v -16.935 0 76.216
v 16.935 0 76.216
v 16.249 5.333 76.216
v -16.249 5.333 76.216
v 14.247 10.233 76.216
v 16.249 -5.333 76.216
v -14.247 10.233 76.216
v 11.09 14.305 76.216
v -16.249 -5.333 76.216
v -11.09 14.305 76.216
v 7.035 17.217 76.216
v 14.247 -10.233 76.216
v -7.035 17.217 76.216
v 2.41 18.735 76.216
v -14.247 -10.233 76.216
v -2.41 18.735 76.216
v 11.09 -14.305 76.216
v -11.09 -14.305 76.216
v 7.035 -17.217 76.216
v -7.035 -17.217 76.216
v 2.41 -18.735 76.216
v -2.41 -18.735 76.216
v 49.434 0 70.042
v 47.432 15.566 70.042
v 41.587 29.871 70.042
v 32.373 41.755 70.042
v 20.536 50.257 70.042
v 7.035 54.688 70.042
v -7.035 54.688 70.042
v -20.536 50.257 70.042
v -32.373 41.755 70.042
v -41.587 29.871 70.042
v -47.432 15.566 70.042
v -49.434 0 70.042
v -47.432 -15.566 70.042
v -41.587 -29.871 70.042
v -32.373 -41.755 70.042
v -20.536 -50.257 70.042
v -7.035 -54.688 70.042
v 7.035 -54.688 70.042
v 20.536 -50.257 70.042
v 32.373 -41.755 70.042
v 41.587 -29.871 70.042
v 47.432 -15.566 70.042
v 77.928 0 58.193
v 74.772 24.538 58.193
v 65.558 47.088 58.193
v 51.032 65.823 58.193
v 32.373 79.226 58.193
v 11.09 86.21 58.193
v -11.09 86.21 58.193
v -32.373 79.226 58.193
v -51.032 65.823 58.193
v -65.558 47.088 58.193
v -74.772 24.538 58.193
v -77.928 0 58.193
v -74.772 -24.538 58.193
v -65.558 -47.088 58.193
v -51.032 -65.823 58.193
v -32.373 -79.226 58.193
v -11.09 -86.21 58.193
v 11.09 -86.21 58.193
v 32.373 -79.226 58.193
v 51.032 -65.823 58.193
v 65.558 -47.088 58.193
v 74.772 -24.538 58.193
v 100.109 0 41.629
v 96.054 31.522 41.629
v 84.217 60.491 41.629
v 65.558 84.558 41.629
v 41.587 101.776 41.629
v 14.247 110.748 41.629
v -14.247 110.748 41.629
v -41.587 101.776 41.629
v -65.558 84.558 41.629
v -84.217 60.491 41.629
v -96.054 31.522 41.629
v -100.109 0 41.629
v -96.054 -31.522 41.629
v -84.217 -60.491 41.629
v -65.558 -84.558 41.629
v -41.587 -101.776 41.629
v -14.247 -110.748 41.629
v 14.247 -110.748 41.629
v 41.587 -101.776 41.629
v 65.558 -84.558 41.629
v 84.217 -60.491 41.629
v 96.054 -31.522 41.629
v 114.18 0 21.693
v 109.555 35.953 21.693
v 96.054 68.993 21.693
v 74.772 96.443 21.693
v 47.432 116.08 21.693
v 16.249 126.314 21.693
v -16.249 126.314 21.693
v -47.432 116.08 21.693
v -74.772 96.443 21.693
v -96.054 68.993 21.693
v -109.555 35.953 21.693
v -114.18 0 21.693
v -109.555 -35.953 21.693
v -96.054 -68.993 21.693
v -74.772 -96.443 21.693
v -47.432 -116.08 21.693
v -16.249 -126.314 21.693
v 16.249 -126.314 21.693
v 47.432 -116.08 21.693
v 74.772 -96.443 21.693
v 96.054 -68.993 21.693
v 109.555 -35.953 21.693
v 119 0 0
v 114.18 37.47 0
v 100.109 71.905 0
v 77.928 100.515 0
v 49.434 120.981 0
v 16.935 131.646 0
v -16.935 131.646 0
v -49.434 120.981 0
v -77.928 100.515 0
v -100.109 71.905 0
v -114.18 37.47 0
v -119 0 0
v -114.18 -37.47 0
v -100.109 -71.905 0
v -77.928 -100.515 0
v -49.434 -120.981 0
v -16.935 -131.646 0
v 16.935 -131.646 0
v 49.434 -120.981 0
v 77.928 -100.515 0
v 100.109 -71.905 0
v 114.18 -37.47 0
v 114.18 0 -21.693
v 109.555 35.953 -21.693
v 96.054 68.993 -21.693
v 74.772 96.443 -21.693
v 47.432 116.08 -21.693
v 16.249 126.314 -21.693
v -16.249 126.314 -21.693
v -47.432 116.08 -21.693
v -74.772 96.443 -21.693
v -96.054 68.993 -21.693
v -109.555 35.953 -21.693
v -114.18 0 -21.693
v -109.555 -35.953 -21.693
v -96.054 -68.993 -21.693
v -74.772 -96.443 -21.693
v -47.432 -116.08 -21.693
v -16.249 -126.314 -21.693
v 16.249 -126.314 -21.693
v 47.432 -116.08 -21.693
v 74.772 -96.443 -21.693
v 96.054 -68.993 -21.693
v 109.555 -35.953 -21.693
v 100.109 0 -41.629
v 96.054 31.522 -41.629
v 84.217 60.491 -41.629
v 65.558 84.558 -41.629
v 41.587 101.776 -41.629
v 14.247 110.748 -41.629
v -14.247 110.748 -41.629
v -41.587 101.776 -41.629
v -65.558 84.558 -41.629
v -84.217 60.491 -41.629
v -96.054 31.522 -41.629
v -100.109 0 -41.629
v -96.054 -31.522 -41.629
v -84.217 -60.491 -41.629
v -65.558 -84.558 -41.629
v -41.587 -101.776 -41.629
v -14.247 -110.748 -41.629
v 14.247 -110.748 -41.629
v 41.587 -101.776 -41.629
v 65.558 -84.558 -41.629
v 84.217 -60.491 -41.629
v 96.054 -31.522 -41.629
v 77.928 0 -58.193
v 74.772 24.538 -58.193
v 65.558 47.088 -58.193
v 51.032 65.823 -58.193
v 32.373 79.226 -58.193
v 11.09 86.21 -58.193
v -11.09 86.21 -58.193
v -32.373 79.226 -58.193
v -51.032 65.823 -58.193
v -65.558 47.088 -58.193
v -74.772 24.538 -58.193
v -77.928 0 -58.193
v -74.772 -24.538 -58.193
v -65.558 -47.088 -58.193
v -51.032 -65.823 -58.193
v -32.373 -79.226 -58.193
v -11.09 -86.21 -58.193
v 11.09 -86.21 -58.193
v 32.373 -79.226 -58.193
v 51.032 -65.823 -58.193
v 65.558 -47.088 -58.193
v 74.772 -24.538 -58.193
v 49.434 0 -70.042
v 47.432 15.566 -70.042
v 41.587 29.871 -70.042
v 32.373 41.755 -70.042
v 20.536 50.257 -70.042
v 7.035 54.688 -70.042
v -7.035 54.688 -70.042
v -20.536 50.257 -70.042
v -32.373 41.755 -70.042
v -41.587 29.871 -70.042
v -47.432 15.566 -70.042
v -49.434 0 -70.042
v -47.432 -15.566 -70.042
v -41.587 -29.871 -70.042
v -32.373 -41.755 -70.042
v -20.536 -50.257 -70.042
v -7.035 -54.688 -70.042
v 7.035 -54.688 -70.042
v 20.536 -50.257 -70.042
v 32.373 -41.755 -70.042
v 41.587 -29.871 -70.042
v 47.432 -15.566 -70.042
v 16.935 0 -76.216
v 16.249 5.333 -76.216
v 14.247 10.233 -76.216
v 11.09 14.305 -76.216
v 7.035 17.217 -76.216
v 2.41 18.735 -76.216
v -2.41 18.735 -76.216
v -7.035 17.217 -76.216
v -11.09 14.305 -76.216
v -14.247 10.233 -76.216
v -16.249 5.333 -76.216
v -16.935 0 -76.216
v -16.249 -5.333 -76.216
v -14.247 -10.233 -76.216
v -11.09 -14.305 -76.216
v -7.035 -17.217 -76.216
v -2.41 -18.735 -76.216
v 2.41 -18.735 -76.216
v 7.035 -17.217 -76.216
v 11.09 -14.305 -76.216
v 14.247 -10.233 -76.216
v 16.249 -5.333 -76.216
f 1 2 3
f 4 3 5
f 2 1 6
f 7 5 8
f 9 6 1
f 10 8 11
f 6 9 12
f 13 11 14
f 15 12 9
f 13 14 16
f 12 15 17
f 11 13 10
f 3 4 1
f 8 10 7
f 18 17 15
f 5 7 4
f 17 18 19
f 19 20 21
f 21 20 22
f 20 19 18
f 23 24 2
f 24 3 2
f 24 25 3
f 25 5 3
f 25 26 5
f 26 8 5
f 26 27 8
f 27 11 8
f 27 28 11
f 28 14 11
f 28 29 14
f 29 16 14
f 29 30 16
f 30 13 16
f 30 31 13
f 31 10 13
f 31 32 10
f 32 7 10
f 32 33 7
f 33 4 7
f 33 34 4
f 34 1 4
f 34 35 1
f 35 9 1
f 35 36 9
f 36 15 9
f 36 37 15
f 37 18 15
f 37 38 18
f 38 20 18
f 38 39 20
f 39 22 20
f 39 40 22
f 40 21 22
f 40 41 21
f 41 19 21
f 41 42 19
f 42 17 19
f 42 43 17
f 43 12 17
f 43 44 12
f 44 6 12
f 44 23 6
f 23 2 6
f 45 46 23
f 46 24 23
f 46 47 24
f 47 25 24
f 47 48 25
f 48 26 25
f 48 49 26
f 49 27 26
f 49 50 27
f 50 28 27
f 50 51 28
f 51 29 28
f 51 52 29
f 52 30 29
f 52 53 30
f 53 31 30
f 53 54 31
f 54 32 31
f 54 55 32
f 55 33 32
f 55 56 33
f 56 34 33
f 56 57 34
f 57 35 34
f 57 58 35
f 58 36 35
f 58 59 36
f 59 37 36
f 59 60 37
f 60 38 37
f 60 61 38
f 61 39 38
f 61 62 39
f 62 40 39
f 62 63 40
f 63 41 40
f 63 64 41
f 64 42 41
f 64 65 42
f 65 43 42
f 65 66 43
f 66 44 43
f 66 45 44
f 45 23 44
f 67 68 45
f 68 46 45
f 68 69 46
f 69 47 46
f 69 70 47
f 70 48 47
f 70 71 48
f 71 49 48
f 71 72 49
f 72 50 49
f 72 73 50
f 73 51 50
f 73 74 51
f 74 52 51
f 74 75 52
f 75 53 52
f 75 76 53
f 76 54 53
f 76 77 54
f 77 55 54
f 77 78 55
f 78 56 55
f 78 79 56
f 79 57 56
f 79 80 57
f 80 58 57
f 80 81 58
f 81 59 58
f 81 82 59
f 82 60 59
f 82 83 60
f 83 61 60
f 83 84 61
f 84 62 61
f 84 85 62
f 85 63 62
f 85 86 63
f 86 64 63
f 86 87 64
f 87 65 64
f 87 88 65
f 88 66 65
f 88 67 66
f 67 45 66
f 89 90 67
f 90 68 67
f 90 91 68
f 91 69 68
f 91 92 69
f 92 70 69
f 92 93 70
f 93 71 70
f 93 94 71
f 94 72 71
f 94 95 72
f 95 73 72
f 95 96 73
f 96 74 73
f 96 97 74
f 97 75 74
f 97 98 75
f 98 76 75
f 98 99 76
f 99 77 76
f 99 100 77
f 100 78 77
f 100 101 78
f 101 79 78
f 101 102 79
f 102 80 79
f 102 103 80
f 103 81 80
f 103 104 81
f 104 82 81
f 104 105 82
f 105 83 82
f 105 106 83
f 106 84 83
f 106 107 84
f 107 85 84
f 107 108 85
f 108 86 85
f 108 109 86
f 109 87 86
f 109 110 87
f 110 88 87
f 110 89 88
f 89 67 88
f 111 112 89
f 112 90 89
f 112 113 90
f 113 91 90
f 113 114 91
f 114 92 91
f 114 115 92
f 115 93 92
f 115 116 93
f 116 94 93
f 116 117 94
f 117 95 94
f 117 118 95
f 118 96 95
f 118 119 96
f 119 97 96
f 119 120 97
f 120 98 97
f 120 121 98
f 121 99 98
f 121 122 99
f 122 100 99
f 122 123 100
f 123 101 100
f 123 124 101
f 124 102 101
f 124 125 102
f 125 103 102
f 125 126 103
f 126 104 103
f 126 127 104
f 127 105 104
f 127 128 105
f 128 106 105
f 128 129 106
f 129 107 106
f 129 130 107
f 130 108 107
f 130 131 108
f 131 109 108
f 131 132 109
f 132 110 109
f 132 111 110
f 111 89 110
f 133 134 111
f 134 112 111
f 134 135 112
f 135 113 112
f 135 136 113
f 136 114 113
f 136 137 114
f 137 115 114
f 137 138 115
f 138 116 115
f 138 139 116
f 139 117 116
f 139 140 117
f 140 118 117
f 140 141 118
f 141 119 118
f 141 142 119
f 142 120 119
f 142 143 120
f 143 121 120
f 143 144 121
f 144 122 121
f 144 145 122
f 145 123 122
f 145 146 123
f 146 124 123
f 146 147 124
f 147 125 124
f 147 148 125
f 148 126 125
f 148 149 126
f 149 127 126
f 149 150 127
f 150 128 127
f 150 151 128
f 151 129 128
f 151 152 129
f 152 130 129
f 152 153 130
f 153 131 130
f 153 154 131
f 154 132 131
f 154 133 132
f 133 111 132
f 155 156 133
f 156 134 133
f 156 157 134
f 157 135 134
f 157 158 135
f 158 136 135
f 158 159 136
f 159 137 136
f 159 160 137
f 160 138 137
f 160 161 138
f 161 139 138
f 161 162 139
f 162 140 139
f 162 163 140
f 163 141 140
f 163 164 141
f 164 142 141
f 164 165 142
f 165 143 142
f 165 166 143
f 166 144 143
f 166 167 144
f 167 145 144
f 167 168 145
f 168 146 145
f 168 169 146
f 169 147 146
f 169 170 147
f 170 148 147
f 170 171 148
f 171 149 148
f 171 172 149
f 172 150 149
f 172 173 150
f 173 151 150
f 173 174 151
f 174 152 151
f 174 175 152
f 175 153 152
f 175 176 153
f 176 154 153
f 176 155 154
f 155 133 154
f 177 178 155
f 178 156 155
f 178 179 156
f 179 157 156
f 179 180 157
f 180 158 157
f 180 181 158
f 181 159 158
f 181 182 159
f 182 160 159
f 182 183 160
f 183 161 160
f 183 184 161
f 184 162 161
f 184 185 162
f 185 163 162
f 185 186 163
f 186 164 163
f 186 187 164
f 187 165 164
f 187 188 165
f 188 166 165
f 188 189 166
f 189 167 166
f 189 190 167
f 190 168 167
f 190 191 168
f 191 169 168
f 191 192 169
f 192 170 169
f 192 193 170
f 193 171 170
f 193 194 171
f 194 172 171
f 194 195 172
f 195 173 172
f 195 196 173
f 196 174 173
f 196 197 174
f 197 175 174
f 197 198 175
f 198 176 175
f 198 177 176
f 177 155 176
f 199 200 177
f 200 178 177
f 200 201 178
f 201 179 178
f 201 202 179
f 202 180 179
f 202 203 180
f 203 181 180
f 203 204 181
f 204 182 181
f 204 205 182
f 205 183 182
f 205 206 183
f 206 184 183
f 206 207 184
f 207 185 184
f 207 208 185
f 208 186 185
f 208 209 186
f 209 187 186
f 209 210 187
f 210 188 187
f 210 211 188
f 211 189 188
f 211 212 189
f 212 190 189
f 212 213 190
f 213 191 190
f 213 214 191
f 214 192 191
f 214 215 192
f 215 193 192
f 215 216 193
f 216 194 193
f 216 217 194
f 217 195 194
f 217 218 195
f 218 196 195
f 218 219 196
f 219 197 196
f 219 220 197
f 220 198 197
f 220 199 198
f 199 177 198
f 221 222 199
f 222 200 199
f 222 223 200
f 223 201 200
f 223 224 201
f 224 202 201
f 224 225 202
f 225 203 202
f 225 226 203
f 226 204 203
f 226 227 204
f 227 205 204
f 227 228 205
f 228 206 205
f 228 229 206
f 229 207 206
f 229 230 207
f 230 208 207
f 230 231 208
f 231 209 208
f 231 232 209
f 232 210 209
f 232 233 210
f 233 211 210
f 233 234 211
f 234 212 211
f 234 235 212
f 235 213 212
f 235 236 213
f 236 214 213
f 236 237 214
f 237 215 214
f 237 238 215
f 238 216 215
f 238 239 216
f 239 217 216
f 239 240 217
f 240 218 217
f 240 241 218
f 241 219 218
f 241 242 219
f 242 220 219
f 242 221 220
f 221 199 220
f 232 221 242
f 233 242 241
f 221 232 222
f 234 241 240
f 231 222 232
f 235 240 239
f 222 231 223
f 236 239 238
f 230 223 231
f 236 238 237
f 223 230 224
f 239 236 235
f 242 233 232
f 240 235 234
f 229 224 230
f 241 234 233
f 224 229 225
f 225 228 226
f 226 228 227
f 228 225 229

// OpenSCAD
// Generated by SolidPython 1.0.1 on 2020-07-29 00:46:53


scale(v = [17, 19, 11]) {
	sphere(r = 7);
}
/***********************************************
*********      SolidPython code:      **********
************************************************
 
# import packages: SolidPython
from solid import *
from solid.utils import *
from itertools import chain, combinations, permutations


class Resize:

    def __init__(self, scad_file):
        self.scad_file = scad_file
        #self.scad_file = import_scad(scad_file)
        # cone/cylinder param:
        self.r1 = 0
        self.r2 = 0
        self.h = 0
        # rectangular prism param:
        self.w = 0
        self.l = 0
        # ellipse param:
        self.r = 0

    # import OpenScad code (file name corresponds to shape)


    # classify shape + parameters
    def assign(self, param1, param2, param3):
        if self.scad_file == 'cone.scad':
            self.r1 = param1
            self.r2 = param2
            self.h = param3
        elif self.scad_file == 'cylinder.scad':
            self.r1 = param1
            self.r2 = param2
            self.h = param3
        elif self.scad_file == 'rectangularPrism.scad':
            self.h = param1
            self.l = param2
            self.w = param3
        else:
            self.r = param1
            self.h = param2

    # resize parameters
    def iterate(self):
        x = range(3, 20, 2)
        i = 1
        if self.scad_file == 'cone.scad':
            tempList = list(permutations(x, 2))
            for temp in tempList:
                param1 = temp[0]
                param2 = temp[1]
                filepath = 'produced_scad_files/' + 'cone' + str(param1) + '_' + str(param2) + '_' + '.scad'
                scad_render_to_file(cylinder(h=param1, r1=param2, r2=0), filepath)

        elif self.scad_file == 'cylinder.scad':
            tempList = list(permutations(x, 3))
            for temp in tempList:
                param1 = temp[0]
                param2 = temp[1]
                filepath = 'produced_scad_files/' + 'cylinder' + str(param1) + '_' + str(param2) + '_' + '.scad'
                scad_render_to_file(cylinder(h=param1, r1=param2, r2=param2), filepath)

        elif self.scad_file == 'rectangularPrism.scad':
            tempList = list(permutations(x, 3))
            for temp in tempList:
                param1 = temp[0]
                param2 = temp[1]
                param3 = temp[2]
                filepath = 'produced_scad_files/' + 'rectangularPrism' + str(param1) + '_' + str(param2) + '_' + str(
                    param3) + '.scad'
                scad_render_to_file(cube(size=(param1, param2, param3)), filepath)

        elif self.scad_file == 'ellipse.scad':
            tempList = list(permutations(x, 4))
            for temp in tempList:
                param1 = temp[0]
                param2 = temp[1]
                param3 = temp[2]
                param4 = temp[3]
                filepath = 'produced_scad_files/' + 'ellipse' + str(param1) + '_' + str(param2) + '_' + str(param3) + '_' + str(param4) + '.scad'
                scad_render_to_file(scale([param1, param2, param3])(sphere(r=param4)), filepath)

    def render_to_scadfile(self):
        scad_render_to_file(scad, 'example.scad') 
 
************************************************/
